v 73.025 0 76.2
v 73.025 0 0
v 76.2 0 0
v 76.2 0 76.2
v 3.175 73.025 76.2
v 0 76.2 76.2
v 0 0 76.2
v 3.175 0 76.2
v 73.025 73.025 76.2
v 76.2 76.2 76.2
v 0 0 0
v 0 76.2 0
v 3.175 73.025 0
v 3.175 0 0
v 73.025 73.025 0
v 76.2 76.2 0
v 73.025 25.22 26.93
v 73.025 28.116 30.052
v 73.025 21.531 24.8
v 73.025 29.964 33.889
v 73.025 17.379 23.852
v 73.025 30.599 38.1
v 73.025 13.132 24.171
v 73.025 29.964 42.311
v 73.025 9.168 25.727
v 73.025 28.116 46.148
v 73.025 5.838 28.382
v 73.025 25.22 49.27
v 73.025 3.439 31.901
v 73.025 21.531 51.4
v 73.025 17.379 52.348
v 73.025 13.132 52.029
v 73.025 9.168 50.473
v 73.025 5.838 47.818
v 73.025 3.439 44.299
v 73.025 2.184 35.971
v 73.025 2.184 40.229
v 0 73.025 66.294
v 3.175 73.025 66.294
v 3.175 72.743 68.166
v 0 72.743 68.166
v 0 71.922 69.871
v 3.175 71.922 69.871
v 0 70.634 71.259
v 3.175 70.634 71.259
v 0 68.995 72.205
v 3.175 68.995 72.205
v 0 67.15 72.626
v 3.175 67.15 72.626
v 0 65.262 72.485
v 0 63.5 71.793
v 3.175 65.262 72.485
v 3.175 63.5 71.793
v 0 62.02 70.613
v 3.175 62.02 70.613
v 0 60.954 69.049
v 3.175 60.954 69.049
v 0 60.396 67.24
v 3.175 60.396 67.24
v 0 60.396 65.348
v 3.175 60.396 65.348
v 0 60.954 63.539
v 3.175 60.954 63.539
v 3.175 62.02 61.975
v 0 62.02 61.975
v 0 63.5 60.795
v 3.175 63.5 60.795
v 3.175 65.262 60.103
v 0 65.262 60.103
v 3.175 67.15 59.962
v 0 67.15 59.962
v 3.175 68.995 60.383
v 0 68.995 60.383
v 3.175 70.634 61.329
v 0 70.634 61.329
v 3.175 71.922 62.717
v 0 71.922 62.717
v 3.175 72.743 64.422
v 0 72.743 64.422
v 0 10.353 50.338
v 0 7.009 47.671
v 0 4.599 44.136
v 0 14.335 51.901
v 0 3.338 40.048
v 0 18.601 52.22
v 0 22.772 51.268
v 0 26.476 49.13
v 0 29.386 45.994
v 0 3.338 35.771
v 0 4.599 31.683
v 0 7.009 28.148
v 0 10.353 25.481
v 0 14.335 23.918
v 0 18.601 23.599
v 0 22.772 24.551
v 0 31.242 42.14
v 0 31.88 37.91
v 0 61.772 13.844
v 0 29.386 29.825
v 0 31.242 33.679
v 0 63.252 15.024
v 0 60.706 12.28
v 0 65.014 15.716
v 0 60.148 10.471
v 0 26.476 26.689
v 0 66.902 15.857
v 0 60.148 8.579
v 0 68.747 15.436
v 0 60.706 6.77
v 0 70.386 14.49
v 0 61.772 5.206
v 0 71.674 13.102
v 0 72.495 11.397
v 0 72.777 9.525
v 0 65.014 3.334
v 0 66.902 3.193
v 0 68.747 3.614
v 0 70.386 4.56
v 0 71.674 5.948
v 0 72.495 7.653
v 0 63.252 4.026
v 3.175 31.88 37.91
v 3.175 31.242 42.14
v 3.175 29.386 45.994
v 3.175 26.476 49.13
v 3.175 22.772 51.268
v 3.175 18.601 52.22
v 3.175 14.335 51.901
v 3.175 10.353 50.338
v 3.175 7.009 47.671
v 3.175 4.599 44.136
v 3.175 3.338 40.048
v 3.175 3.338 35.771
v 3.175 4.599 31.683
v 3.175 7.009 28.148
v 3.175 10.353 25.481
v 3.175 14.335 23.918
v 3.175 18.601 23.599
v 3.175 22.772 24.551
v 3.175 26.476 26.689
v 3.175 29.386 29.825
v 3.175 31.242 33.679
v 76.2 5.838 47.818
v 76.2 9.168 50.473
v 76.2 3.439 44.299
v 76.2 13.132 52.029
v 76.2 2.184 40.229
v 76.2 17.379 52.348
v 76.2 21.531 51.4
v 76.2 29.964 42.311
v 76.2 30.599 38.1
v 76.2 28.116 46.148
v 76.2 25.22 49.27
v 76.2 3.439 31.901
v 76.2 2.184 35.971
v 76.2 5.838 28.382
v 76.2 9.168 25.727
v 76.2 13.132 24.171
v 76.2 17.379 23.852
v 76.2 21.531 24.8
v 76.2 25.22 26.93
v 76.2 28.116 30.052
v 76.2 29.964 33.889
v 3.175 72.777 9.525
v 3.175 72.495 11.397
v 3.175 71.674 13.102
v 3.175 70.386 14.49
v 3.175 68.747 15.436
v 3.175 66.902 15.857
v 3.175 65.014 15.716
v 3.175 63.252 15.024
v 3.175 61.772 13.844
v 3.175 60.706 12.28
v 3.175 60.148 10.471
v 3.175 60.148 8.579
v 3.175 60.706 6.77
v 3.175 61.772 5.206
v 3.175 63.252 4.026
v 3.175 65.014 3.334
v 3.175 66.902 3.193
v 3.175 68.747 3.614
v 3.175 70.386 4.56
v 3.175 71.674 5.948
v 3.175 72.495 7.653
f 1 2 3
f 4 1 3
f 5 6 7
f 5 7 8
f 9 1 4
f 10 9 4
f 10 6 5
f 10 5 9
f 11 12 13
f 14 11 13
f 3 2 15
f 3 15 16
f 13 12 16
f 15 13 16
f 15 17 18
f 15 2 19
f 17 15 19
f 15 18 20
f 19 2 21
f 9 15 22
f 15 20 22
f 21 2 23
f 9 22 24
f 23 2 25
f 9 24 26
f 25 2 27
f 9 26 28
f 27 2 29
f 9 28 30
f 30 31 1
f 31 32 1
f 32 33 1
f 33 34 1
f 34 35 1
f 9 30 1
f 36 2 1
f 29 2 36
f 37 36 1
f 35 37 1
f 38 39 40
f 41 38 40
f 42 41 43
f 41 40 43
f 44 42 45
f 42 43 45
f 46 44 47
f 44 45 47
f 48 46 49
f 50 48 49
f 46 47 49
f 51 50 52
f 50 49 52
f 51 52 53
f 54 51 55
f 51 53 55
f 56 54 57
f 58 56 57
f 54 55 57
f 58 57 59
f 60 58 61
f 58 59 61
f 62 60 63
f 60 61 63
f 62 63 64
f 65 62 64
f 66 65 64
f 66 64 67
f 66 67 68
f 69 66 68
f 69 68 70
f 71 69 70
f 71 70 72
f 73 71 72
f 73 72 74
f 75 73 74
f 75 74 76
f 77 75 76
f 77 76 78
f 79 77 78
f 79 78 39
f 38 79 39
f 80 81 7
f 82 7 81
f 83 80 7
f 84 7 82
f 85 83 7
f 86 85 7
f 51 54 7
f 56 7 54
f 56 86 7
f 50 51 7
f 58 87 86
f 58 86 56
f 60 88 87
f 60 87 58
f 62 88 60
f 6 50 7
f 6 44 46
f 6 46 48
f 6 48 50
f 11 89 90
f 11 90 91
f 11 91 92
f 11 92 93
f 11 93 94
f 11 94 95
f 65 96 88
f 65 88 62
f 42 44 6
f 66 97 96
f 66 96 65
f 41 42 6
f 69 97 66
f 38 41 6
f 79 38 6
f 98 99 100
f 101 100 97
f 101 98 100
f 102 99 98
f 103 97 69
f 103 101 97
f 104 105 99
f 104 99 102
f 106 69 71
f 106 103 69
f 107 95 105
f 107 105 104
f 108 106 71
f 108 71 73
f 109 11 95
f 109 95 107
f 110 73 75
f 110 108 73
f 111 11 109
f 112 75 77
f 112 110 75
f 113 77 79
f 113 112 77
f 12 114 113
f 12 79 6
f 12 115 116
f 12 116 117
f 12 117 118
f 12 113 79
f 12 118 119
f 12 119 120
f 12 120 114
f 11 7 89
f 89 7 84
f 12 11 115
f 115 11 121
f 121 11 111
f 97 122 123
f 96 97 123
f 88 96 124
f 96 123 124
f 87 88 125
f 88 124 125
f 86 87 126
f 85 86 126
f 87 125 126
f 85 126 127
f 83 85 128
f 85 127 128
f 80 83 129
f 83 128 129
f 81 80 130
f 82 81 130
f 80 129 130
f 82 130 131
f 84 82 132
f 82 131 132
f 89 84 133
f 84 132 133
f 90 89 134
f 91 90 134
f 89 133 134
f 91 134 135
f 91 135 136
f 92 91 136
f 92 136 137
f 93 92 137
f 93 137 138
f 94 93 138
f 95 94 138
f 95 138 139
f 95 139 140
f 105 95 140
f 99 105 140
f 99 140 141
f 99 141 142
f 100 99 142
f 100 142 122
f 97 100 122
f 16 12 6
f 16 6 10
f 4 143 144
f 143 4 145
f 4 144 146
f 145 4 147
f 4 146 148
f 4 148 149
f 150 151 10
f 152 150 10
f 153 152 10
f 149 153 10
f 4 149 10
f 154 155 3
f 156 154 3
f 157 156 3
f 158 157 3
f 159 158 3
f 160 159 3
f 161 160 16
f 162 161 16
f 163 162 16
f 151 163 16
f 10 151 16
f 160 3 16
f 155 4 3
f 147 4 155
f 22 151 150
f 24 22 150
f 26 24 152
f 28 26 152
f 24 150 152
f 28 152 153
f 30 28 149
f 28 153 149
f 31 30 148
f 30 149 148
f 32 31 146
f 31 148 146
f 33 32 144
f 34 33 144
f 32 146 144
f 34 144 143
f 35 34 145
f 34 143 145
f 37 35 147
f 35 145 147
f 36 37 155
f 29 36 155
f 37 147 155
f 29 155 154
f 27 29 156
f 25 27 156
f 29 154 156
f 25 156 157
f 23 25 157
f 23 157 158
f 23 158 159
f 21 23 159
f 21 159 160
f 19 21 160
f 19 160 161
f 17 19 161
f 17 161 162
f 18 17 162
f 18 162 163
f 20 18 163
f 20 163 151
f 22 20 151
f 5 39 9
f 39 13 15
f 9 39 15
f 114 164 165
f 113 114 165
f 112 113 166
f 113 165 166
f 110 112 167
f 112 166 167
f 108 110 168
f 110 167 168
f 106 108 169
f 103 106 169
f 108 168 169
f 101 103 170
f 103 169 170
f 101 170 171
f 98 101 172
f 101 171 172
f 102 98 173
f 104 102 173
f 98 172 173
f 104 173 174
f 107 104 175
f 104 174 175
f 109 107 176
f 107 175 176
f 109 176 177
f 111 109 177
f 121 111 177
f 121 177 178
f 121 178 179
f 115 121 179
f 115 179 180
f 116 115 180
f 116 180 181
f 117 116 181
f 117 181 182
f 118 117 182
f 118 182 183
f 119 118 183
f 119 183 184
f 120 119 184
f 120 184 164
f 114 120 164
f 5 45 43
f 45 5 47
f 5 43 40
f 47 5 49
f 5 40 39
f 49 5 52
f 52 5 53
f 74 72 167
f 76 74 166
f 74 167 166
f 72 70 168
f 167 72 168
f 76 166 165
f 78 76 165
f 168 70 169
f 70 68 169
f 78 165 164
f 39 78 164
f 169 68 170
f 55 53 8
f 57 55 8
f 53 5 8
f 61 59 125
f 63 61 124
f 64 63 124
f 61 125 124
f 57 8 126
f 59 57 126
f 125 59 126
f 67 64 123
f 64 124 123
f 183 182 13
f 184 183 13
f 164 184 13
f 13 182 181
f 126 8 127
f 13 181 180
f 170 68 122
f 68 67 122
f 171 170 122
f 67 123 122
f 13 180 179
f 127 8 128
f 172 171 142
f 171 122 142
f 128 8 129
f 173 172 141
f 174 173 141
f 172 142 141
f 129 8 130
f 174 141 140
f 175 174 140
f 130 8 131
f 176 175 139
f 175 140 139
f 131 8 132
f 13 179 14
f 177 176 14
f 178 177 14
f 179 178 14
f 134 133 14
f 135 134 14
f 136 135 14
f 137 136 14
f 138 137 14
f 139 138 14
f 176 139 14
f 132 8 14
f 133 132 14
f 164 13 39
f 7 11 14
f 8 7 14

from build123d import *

# Parameters (mm, degrees)
F0_W     = 76.2
F0_H     = 76.2
F0_W_2   = 69.85
F0_H_2   = 69.85
F1_DEPTH = 76.2
F3_DEPTH = 25.4
F4_R     = 6.35
F5_DEPTH = 25.4
F4_R_2   = 14.351
F7_DEPTH = 25.4
F6_R     = 14.2875
F8_DEPTH = 25.4


with BuildPart() as f1:
    # F0 (on Top) → F1 (new body)
    with BuildSketch(Plane.XY):
        with Locations((38.1, 38.1)):
            Rectangle(F0_W, F0_H)
        with Locations((38.1, 38.1)):
            Rectangle(F0_W_2, F0_H_2, mode=Mode.SUBTRACT)
    extrude(amount=F1_DEPTH)

    # F2 (on face) → F3 (cut)
    with BuildSketch(Plane.XZ):
        Polygon((3.175, 76.2), (3.175, 14.417147), (3.175, 0), (73.025, 0), (73.025, 76.2), align=None)
    extrude(amount=-F3_DEPTH, mode=Mode.SUBTRACT)

    # F4 (on face) → F5 (cut)
    with BuildSketch(Plane.YZ.offset(3.175)):
        with Locations((66.675, 66.294)):
            Circle(F4_R)
        with Locations((66.427297, 9.525)):
            Circle(F4_R)
    extrude(amount=-F5_DEPTH, mode=Mode.SUBTRACT)

    # F4 (on face) → F7 (cut)
    with BuildSketch(Plane.YZ.offset(3.175)):
        with Locations((17.528682, 37.9095)):
            Circle(F4_R_2)
    extrude(amount=-F7_DEPTH, mode=Mode.SUBTRACT)

    # F6 (on face) → F8 (cut)
    with BuildSketch(Plane.YZ.offset(76.2)):
        with Locations((16.311424, 38.1)):
            Circle(F6_R)
    extrude(amount=-F8_DEPTH, mode=Mode.SUBTRACT)


solid = f1.part
